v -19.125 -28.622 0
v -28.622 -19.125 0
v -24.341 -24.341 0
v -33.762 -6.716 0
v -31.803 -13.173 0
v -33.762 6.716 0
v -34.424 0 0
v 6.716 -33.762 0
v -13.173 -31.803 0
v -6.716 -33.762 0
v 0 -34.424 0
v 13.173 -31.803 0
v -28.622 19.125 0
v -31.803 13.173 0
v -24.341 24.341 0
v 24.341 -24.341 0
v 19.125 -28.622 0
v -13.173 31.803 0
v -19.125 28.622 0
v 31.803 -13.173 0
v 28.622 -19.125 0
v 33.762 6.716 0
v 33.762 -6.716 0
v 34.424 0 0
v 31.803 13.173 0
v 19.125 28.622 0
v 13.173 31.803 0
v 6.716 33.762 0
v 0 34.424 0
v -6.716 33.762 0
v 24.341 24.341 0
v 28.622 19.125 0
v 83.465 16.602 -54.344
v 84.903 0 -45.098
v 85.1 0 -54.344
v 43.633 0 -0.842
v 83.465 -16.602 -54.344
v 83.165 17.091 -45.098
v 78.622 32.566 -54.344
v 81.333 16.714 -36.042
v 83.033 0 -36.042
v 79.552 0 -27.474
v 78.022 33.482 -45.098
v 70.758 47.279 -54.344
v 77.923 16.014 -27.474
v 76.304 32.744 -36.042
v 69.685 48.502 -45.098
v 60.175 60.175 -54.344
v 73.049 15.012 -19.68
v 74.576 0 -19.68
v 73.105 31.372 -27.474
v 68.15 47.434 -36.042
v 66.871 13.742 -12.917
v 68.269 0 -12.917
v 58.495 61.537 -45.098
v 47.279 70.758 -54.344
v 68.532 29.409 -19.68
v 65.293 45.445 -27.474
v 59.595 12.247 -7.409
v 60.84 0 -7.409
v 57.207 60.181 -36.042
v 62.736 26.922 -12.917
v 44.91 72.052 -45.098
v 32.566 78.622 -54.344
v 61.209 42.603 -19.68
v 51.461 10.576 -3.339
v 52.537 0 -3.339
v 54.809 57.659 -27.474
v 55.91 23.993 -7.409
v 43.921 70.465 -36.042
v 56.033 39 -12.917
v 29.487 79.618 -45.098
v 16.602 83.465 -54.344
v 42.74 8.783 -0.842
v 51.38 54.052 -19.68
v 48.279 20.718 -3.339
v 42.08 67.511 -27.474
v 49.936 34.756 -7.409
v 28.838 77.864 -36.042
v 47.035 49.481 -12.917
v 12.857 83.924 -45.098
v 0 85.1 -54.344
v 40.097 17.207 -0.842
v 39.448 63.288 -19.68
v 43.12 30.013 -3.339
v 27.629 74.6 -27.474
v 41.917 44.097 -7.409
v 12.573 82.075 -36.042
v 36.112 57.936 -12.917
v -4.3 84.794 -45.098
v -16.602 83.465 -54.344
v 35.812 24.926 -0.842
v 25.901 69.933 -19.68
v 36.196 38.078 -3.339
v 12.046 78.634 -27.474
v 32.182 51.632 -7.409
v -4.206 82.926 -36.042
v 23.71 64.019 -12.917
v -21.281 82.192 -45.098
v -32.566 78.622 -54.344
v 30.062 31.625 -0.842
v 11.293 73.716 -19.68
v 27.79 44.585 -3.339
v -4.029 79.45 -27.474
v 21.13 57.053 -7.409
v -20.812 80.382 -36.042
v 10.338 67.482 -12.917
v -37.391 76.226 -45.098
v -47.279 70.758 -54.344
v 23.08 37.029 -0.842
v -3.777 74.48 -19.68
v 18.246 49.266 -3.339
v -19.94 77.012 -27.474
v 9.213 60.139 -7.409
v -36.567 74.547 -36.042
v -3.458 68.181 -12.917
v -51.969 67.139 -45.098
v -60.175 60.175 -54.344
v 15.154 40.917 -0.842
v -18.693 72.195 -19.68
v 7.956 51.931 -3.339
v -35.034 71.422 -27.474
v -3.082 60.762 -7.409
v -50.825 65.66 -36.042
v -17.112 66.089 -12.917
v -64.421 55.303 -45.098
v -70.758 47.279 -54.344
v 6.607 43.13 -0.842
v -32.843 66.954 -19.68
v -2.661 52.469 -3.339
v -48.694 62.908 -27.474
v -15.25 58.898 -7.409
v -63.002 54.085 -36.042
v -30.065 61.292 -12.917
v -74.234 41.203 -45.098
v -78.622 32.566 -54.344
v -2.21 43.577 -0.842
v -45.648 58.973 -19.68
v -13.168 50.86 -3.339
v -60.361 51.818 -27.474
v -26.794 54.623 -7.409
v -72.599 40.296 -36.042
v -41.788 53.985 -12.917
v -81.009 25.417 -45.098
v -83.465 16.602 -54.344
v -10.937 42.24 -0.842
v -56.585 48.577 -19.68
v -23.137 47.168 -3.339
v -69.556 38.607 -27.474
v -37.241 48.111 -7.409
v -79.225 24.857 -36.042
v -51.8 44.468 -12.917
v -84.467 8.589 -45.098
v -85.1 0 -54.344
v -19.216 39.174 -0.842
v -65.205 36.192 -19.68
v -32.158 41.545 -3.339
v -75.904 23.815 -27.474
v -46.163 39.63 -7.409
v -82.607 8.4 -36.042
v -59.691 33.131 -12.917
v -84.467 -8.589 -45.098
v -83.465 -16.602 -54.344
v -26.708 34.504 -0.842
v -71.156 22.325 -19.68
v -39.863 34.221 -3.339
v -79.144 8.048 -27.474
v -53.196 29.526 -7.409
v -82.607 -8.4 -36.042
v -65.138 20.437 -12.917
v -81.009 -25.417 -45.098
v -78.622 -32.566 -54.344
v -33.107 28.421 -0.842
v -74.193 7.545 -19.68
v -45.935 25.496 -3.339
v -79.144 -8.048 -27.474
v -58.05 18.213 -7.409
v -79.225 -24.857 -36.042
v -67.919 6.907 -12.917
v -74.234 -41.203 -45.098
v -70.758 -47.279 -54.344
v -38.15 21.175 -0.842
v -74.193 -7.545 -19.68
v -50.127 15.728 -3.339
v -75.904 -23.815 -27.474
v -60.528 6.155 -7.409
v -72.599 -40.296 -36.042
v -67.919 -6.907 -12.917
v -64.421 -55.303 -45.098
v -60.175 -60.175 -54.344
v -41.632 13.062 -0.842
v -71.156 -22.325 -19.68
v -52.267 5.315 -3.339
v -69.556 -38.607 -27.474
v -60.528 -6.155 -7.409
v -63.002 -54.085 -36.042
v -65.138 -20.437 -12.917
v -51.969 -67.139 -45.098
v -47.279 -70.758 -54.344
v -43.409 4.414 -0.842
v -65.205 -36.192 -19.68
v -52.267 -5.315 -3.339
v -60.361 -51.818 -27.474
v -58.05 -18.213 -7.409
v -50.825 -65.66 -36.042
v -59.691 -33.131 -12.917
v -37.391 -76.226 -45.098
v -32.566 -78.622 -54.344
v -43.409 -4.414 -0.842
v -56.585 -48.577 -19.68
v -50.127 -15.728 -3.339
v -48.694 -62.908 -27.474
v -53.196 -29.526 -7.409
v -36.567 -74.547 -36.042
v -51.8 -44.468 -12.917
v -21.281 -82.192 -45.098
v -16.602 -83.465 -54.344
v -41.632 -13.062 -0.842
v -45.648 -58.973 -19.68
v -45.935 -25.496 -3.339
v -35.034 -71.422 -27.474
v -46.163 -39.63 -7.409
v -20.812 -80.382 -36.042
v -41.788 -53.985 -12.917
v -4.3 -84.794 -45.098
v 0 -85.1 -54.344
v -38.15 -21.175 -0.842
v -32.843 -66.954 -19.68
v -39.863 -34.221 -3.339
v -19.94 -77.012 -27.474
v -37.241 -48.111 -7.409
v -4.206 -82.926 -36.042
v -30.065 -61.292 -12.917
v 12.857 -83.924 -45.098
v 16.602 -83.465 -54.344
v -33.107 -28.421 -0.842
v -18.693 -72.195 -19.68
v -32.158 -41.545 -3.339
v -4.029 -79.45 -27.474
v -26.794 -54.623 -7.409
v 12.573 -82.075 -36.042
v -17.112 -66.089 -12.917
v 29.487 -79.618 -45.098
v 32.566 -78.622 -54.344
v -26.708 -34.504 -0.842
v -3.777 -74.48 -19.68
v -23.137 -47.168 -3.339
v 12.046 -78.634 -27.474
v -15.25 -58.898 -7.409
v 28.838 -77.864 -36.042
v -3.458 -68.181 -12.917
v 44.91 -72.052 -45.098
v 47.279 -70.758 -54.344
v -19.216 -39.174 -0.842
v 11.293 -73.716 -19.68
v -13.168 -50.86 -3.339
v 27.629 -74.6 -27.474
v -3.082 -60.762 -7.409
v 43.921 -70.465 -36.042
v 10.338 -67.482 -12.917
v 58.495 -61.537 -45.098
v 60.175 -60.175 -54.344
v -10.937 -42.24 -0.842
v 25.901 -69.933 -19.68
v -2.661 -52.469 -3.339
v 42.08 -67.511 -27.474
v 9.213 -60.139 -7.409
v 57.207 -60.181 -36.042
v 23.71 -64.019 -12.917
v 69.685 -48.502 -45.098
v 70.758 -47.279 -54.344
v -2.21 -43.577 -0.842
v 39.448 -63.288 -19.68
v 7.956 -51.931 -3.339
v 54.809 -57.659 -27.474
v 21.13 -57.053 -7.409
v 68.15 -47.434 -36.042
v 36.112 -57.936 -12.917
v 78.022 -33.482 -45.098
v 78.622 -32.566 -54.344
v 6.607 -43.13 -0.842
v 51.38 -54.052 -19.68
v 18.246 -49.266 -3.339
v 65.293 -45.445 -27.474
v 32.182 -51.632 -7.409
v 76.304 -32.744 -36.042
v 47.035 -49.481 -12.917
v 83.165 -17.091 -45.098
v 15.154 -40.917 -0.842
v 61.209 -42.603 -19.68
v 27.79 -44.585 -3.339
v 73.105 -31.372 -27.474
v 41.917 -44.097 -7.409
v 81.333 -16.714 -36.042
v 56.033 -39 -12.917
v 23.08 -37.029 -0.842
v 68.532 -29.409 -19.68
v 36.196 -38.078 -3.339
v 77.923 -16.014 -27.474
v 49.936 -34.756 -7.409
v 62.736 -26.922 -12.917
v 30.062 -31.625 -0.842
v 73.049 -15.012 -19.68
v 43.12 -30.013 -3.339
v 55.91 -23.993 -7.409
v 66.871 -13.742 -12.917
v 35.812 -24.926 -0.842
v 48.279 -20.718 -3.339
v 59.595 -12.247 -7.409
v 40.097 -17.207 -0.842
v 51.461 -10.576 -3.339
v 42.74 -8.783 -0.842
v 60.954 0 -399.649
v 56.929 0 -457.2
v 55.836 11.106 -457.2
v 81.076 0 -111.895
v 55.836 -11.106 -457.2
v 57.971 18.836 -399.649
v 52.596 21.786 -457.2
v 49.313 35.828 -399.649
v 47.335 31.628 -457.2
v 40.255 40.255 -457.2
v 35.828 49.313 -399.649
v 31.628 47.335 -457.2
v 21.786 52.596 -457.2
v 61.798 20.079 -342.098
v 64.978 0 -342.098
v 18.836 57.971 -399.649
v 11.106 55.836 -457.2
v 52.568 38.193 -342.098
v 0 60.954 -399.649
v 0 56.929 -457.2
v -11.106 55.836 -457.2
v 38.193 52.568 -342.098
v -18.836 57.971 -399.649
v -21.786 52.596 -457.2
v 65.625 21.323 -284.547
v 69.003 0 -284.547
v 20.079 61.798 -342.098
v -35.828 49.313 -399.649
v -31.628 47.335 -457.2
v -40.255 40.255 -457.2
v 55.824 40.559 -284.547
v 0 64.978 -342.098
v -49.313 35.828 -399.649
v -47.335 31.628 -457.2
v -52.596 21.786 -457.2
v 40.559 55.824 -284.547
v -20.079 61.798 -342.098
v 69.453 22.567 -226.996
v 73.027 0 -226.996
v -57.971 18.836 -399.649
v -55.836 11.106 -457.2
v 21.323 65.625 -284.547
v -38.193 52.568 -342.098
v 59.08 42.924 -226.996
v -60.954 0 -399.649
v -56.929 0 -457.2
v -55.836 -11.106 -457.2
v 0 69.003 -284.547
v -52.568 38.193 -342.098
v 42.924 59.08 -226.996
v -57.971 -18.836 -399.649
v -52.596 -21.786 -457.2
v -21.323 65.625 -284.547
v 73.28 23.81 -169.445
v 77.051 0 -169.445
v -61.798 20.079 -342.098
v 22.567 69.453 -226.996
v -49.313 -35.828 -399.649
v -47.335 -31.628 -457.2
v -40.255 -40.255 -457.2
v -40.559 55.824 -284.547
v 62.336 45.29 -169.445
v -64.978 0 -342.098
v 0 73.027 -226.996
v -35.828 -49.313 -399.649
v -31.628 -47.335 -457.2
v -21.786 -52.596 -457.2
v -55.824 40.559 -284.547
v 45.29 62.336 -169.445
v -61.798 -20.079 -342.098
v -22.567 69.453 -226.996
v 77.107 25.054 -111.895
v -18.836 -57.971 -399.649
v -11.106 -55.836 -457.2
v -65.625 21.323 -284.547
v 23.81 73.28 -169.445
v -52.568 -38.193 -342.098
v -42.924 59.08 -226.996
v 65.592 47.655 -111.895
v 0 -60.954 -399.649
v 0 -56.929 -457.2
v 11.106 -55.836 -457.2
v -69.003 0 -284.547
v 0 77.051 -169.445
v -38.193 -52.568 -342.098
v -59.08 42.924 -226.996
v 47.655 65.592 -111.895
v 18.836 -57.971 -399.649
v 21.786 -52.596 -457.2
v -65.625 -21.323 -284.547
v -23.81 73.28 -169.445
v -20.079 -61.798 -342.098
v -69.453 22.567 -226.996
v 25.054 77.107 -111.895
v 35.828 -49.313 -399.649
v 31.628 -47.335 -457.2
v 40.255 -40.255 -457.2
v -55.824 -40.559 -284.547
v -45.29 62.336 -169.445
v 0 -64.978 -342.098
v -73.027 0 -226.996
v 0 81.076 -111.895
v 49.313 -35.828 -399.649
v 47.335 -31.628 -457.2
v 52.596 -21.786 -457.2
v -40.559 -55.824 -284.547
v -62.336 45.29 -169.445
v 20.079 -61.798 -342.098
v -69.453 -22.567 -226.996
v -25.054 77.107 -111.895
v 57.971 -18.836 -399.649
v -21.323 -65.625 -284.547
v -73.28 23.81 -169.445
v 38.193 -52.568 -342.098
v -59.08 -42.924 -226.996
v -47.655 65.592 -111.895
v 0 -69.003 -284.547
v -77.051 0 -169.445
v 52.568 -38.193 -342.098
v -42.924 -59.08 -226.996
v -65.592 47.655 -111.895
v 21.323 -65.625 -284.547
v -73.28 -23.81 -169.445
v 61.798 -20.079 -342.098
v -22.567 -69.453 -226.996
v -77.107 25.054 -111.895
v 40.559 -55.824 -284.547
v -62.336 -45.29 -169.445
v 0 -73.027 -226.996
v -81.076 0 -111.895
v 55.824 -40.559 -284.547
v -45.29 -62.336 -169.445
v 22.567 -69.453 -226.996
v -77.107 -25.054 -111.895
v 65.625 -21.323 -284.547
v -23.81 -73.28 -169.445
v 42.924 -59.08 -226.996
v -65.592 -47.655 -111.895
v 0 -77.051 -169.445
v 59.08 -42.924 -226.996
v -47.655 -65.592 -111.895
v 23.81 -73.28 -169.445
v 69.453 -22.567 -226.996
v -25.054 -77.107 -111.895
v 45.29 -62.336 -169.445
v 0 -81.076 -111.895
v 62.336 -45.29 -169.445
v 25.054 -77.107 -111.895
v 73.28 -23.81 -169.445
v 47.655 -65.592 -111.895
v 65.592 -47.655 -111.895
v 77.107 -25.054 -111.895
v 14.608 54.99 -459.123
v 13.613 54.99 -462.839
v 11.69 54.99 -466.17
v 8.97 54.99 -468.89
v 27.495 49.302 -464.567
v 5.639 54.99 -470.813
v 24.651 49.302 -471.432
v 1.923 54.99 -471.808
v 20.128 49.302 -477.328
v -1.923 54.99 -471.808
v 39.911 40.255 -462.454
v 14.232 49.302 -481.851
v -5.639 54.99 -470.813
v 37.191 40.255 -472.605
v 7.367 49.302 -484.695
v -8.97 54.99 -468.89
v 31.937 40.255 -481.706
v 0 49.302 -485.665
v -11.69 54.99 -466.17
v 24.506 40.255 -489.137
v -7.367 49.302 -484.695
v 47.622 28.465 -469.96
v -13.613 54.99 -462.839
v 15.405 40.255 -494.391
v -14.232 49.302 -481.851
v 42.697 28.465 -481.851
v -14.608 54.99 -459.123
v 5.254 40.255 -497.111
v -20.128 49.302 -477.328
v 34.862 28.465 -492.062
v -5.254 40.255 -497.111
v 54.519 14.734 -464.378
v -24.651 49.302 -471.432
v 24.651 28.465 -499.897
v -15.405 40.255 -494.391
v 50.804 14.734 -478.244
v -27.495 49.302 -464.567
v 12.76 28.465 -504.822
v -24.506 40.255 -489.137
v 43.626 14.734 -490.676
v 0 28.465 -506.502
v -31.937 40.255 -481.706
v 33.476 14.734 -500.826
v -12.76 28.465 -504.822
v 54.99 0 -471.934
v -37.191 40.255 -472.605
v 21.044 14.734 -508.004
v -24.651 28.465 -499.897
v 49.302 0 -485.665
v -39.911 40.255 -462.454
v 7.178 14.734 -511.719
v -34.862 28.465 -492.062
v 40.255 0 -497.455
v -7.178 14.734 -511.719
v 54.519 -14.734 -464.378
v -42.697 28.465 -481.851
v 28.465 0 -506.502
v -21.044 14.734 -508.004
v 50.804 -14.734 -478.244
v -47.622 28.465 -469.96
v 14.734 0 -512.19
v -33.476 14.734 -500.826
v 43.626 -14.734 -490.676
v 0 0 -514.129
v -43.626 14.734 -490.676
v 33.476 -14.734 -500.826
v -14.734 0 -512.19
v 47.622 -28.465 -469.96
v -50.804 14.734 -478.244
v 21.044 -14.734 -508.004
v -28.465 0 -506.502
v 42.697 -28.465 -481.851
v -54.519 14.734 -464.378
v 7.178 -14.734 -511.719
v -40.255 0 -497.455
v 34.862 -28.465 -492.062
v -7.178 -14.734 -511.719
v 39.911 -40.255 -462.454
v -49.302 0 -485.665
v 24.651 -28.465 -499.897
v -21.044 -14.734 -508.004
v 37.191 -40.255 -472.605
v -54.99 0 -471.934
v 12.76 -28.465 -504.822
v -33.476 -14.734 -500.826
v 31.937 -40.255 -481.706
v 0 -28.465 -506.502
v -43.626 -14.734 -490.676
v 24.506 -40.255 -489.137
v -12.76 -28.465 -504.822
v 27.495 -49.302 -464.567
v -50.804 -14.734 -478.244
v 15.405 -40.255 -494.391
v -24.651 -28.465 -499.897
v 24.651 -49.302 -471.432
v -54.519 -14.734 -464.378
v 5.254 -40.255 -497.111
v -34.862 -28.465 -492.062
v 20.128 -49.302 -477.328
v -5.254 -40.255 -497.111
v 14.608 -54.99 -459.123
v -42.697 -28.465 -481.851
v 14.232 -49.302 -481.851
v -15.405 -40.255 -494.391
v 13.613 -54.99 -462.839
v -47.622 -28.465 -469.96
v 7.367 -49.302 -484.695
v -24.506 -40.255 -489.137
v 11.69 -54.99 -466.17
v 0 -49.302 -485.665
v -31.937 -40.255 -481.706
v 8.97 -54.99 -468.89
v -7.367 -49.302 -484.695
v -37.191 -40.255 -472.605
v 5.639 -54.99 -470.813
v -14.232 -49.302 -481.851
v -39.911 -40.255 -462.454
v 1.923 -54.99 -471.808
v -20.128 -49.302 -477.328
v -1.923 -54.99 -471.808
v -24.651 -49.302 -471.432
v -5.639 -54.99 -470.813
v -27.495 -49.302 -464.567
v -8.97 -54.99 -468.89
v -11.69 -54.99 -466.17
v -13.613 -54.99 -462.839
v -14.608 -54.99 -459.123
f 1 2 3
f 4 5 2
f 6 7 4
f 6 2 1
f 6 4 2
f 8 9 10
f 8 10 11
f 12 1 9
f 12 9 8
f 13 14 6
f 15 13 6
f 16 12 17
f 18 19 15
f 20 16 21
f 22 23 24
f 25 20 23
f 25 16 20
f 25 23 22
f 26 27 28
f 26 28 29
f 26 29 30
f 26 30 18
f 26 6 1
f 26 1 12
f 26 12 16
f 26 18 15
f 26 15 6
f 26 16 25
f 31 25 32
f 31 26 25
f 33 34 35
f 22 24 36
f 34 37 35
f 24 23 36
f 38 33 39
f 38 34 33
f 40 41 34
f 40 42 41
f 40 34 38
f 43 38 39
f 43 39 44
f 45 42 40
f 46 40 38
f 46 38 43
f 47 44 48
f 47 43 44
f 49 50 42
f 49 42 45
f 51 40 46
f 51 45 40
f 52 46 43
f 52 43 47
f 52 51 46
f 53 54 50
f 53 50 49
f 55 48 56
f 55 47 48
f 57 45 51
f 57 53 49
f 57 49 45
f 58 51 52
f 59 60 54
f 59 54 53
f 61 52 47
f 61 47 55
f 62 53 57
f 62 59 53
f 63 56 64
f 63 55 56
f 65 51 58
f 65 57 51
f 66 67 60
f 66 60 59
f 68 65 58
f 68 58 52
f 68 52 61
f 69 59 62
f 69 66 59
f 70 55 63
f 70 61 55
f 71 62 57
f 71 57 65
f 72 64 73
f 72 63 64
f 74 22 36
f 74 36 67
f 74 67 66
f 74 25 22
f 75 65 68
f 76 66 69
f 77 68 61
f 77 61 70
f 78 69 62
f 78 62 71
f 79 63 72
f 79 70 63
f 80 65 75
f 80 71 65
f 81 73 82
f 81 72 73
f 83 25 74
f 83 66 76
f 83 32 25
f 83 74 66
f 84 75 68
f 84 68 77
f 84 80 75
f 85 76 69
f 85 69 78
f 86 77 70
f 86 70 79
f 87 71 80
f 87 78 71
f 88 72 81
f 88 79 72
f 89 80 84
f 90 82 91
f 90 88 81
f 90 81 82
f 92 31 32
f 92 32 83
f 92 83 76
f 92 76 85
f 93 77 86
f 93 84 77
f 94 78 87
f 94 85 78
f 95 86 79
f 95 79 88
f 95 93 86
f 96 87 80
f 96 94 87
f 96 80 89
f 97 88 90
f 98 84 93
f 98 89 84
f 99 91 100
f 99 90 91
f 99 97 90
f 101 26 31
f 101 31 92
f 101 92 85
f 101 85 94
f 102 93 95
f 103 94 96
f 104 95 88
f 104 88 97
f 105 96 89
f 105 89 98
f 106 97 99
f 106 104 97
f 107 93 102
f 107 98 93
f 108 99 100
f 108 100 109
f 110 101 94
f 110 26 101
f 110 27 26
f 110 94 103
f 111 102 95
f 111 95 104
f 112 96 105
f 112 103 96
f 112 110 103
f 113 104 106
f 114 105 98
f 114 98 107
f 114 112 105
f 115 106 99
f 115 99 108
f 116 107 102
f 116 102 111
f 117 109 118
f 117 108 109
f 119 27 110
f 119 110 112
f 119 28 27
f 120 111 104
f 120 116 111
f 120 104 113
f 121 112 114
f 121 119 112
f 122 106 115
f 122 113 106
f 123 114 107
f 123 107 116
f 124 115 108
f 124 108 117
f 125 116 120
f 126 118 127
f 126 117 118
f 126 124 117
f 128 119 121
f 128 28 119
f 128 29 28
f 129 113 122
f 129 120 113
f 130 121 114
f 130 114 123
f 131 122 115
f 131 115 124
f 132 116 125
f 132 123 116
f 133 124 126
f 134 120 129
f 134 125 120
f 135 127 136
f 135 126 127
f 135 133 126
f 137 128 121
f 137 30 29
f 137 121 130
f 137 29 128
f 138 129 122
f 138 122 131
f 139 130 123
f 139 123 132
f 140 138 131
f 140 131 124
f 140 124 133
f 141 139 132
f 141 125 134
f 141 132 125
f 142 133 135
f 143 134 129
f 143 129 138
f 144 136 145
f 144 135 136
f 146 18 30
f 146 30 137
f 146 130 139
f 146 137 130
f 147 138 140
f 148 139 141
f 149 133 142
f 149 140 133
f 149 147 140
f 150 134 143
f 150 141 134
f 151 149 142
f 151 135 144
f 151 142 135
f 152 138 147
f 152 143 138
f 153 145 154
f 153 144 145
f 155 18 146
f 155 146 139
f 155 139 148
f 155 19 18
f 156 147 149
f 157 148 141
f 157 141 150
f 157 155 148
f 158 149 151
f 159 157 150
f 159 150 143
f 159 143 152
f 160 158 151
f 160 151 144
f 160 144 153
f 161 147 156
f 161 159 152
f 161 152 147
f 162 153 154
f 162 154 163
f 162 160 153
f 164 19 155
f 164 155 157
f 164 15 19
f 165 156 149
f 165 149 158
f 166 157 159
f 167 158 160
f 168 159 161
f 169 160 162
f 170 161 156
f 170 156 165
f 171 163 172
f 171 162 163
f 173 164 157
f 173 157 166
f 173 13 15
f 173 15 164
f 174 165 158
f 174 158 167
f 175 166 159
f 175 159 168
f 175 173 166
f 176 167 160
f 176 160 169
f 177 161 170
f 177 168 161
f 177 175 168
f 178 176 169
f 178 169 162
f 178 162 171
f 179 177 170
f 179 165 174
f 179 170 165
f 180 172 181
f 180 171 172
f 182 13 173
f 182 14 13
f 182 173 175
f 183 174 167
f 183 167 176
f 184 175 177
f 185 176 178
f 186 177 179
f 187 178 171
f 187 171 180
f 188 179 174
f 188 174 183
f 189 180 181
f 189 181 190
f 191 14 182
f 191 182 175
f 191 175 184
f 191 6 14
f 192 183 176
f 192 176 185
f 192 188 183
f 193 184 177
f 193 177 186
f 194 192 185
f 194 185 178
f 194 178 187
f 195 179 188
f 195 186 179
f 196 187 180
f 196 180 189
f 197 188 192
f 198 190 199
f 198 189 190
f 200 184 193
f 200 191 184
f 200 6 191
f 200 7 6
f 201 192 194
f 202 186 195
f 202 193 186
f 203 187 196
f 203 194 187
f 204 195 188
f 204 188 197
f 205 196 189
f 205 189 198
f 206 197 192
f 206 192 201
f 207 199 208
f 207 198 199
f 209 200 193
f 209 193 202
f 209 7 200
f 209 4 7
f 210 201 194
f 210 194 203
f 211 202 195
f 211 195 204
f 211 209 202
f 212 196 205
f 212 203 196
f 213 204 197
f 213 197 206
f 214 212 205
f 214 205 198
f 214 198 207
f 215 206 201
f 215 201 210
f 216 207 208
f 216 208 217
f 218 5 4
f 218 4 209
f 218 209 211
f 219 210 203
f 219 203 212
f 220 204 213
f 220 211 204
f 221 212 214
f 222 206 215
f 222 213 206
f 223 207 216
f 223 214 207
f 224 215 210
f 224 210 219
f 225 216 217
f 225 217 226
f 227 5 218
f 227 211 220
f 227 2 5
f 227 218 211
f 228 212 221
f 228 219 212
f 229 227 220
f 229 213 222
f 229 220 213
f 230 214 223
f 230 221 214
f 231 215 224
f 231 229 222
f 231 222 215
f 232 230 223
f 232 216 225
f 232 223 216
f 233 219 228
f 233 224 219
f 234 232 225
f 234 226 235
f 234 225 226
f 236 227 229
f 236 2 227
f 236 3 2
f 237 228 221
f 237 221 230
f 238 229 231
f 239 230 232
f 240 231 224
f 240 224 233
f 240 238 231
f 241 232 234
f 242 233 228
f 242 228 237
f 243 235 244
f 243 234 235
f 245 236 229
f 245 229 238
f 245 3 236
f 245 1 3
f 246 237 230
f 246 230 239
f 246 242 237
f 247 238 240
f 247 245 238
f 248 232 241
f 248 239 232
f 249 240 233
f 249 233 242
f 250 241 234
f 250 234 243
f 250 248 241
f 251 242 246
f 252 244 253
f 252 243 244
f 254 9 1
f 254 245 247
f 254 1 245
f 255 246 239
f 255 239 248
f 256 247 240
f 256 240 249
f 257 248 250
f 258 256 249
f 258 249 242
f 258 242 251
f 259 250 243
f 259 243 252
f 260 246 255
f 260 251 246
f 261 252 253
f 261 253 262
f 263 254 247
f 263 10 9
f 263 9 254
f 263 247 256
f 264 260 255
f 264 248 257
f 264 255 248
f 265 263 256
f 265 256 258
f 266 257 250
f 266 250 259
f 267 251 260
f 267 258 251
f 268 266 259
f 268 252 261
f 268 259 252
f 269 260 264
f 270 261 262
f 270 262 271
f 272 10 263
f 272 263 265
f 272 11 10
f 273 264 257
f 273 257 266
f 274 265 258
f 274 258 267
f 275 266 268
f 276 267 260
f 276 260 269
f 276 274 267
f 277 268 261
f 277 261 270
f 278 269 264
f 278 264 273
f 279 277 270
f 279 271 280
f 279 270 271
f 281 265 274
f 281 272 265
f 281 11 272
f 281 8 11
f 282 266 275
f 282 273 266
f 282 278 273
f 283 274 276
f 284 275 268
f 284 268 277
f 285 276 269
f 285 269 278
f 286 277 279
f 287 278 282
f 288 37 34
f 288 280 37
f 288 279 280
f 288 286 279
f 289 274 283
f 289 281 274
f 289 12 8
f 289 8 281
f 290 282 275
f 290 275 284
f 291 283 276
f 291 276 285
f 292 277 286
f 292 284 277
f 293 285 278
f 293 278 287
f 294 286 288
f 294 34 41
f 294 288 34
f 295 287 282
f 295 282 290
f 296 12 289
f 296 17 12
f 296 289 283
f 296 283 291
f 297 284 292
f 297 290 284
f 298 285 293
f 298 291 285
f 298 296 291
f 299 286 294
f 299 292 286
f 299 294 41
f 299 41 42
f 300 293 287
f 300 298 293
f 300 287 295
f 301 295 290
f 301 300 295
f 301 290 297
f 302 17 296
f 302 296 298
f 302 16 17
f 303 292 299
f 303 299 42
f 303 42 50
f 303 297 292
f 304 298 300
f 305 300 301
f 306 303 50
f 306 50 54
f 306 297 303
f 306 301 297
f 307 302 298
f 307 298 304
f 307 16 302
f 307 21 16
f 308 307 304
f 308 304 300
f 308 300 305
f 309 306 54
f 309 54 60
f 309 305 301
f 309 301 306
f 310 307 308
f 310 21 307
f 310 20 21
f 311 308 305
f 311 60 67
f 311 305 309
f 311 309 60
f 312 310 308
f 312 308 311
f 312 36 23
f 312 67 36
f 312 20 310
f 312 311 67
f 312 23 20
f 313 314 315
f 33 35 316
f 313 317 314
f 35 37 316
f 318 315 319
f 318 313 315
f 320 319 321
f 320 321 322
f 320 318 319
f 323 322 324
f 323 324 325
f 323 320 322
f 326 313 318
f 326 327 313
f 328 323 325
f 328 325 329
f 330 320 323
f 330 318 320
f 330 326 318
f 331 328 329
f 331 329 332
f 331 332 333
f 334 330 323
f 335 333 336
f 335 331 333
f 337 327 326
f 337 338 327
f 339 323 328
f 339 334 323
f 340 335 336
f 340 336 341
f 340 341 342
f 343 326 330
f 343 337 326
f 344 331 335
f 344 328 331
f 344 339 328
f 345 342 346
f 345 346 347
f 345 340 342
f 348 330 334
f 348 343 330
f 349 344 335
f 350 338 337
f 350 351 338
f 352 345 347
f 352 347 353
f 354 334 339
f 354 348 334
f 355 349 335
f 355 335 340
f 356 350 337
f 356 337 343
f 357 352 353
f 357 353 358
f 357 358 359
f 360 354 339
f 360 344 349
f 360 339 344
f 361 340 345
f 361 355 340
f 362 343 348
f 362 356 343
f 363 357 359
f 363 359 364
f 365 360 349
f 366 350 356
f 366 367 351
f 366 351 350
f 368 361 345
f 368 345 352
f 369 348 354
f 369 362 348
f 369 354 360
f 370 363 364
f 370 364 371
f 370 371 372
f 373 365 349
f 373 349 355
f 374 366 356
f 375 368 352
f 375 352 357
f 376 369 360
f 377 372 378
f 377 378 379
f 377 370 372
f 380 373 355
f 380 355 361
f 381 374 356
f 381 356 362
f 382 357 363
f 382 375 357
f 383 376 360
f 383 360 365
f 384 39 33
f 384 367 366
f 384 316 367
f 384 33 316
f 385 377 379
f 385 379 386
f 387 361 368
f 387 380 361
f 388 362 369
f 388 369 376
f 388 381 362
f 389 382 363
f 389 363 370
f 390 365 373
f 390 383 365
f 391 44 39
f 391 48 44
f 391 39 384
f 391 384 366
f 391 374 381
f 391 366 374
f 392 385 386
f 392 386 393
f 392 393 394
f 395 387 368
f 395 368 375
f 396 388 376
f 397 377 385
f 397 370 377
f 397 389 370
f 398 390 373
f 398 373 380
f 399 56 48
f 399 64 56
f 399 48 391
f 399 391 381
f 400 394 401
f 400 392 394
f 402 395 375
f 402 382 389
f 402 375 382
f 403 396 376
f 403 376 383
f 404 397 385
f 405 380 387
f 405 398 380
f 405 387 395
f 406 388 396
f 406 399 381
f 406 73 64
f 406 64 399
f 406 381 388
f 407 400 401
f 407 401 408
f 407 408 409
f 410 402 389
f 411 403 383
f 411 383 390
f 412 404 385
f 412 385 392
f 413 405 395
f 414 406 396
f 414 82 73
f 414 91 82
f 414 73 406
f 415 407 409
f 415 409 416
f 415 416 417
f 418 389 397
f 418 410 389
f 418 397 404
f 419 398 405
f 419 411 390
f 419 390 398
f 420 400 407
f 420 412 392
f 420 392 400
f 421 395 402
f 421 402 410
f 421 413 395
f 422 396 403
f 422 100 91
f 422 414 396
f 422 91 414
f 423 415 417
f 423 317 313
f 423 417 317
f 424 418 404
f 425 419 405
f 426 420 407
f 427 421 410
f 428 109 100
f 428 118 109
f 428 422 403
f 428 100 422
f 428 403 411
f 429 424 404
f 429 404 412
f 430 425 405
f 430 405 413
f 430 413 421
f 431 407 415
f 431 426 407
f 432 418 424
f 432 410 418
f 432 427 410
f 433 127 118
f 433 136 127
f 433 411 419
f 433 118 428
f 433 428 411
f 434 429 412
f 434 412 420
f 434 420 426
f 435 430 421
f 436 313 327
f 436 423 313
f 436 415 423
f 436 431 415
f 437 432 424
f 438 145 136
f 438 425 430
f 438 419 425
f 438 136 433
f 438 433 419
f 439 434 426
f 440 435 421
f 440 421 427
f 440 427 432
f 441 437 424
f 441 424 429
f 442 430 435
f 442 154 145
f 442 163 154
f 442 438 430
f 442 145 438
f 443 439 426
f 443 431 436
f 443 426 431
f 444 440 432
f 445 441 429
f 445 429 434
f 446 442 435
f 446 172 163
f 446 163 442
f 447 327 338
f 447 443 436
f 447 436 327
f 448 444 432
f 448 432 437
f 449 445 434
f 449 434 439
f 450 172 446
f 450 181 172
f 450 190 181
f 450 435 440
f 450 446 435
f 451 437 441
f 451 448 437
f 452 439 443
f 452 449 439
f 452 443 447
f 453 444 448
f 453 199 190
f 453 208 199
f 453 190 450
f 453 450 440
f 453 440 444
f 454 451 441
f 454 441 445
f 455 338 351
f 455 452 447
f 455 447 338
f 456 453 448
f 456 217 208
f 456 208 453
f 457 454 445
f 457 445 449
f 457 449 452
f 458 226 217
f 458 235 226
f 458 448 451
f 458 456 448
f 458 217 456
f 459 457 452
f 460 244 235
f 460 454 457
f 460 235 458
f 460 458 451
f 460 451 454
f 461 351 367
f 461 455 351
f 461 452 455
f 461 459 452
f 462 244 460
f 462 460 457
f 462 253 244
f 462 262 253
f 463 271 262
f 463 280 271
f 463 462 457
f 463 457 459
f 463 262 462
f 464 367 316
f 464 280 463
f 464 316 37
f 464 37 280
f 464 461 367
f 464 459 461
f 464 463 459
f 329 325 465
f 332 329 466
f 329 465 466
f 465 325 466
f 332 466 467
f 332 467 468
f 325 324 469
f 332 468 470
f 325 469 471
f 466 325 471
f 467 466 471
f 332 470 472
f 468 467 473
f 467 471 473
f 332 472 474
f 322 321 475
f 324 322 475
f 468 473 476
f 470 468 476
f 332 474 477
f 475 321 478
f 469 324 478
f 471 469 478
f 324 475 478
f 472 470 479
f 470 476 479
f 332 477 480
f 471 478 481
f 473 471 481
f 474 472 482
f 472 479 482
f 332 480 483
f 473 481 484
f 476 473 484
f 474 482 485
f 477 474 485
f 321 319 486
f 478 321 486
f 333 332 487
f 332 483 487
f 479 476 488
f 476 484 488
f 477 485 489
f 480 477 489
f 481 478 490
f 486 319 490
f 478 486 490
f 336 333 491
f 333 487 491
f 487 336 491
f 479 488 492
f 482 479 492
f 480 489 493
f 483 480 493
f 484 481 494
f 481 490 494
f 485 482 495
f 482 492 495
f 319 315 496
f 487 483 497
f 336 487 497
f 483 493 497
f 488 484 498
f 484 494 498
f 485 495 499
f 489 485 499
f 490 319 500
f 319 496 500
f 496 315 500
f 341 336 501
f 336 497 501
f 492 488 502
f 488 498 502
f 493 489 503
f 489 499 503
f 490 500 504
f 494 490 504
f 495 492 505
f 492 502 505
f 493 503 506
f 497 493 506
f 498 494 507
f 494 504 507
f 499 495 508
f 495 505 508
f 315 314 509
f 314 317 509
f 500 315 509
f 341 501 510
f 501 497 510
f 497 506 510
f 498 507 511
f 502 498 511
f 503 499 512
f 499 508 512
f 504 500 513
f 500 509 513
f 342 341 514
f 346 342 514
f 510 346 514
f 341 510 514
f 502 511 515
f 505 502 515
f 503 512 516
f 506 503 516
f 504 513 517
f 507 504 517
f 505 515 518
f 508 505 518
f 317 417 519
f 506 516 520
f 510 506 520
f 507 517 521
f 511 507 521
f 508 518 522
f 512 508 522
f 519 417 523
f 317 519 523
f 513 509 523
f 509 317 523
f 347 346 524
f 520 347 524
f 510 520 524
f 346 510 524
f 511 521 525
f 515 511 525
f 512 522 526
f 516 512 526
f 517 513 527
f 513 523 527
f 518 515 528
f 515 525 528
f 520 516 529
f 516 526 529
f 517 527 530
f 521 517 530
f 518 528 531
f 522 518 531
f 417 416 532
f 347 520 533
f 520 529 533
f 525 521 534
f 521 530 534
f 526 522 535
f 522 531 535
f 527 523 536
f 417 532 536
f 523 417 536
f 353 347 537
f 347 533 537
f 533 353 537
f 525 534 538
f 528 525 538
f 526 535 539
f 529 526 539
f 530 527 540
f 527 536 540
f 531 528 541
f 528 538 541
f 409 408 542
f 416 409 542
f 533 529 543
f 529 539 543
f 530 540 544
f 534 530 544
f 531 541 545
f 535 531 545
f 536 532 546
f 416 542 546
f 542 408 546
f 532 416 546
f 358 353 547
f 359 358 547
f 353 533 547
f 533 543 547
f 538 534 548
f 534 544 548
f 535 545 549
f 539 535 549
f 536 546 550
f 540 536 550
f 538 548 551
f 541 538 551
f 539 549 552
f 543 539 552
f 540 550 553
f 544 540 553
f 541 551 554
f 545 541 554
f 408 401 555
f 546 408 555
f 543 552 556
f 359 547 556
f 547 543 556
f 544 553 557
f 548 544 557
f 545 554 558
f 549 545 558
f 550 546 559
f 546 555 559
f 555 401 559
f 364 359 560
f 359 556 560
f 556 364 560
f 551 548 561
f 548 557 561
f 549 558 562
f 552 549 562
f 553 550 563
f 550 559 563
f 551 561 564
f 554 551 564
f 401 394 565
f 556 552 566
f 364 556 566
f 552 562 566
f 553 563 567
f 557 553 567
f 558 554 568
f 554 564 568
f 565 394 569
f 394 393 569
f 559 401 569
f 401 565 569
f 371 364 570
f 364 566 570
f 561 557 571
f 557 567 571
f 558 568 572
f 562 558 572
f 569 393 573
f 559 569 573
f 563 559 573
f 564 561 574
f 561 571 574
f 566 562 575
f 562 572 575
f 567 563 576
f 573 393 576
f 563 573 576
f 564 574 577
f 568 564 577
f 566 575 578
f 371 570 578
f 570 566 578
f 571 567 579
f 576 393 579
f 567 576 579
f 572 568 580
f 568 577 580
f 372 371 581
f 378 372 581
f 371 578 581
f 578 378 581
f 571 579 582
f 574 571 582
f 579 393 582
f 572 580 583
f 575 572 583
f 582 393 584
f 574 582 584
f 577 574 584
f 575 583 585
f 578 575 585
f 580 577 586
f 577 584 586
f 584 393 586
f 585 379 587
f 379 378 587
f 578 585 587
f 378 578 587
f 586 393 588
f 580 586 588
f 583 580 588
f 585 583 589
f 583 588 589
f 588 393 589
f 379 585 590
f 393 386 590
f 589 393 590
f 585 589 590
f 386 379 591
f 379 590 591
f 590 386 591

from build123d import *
from build123d.topology import SkipClean

# Parameters (mm, degrees)
SKETCH3_R           = 88.9
BOSS_EXTRUDE1_DEPTH = 457.2
BOSS_EXTRUDE1_DRAFT = -4
FILLET1_R           = 50.8


with BuildPart() as part:
    # Sketch3 → Boss-Extrude1 (with draft: the straight prism first)
    with BuildSketch(Plane.XY):
        Circle(SKETCH3_R)
    extrude(amount=-BOSS_EXTRUDE1_DEPTH)
    # Boss-Extrude1: the draft: its side faces are tilted about the plane it starts from
    boss_extrude1_sides = [part.faces().sort_by_distance(p)[0] for p in [
        (-88.9, 0, -228.6),
    ]]
    draft(boss_extrude1_sides, Plane.XY, BOSS_EXTRUDE1_DRAFT)

    # Sketch6 → Revolve1 (revolve)
    with SkipClean():  # the faces are left unmerged after this step: merging them gives an invalid solid
        with BuildSketch(Plane(origin=(0, 0, 0), x_dir=(0, 0, -1), z_dir=(1, 0, 0))):
            with BuildLine():
                Line((457.2, -56.929461579), (457.2, 56.929461579))
                ThreePointArc((457.2, 56.929461579), (514.129461579, 0), (457.2, -56.929461579))
            make_face()
        revolve(axis=Axis((0, -56.929461579, -457.2), (0, 1, 0)))

    # Fillet1
    fillet1_edges = [part.edges().sort_by_distance(p)[0] for p in [
        (-88.9, 0, 0),
    ]]
    fillet(fillet1_edges, radius=FILLET1_R)


solid = part.part
